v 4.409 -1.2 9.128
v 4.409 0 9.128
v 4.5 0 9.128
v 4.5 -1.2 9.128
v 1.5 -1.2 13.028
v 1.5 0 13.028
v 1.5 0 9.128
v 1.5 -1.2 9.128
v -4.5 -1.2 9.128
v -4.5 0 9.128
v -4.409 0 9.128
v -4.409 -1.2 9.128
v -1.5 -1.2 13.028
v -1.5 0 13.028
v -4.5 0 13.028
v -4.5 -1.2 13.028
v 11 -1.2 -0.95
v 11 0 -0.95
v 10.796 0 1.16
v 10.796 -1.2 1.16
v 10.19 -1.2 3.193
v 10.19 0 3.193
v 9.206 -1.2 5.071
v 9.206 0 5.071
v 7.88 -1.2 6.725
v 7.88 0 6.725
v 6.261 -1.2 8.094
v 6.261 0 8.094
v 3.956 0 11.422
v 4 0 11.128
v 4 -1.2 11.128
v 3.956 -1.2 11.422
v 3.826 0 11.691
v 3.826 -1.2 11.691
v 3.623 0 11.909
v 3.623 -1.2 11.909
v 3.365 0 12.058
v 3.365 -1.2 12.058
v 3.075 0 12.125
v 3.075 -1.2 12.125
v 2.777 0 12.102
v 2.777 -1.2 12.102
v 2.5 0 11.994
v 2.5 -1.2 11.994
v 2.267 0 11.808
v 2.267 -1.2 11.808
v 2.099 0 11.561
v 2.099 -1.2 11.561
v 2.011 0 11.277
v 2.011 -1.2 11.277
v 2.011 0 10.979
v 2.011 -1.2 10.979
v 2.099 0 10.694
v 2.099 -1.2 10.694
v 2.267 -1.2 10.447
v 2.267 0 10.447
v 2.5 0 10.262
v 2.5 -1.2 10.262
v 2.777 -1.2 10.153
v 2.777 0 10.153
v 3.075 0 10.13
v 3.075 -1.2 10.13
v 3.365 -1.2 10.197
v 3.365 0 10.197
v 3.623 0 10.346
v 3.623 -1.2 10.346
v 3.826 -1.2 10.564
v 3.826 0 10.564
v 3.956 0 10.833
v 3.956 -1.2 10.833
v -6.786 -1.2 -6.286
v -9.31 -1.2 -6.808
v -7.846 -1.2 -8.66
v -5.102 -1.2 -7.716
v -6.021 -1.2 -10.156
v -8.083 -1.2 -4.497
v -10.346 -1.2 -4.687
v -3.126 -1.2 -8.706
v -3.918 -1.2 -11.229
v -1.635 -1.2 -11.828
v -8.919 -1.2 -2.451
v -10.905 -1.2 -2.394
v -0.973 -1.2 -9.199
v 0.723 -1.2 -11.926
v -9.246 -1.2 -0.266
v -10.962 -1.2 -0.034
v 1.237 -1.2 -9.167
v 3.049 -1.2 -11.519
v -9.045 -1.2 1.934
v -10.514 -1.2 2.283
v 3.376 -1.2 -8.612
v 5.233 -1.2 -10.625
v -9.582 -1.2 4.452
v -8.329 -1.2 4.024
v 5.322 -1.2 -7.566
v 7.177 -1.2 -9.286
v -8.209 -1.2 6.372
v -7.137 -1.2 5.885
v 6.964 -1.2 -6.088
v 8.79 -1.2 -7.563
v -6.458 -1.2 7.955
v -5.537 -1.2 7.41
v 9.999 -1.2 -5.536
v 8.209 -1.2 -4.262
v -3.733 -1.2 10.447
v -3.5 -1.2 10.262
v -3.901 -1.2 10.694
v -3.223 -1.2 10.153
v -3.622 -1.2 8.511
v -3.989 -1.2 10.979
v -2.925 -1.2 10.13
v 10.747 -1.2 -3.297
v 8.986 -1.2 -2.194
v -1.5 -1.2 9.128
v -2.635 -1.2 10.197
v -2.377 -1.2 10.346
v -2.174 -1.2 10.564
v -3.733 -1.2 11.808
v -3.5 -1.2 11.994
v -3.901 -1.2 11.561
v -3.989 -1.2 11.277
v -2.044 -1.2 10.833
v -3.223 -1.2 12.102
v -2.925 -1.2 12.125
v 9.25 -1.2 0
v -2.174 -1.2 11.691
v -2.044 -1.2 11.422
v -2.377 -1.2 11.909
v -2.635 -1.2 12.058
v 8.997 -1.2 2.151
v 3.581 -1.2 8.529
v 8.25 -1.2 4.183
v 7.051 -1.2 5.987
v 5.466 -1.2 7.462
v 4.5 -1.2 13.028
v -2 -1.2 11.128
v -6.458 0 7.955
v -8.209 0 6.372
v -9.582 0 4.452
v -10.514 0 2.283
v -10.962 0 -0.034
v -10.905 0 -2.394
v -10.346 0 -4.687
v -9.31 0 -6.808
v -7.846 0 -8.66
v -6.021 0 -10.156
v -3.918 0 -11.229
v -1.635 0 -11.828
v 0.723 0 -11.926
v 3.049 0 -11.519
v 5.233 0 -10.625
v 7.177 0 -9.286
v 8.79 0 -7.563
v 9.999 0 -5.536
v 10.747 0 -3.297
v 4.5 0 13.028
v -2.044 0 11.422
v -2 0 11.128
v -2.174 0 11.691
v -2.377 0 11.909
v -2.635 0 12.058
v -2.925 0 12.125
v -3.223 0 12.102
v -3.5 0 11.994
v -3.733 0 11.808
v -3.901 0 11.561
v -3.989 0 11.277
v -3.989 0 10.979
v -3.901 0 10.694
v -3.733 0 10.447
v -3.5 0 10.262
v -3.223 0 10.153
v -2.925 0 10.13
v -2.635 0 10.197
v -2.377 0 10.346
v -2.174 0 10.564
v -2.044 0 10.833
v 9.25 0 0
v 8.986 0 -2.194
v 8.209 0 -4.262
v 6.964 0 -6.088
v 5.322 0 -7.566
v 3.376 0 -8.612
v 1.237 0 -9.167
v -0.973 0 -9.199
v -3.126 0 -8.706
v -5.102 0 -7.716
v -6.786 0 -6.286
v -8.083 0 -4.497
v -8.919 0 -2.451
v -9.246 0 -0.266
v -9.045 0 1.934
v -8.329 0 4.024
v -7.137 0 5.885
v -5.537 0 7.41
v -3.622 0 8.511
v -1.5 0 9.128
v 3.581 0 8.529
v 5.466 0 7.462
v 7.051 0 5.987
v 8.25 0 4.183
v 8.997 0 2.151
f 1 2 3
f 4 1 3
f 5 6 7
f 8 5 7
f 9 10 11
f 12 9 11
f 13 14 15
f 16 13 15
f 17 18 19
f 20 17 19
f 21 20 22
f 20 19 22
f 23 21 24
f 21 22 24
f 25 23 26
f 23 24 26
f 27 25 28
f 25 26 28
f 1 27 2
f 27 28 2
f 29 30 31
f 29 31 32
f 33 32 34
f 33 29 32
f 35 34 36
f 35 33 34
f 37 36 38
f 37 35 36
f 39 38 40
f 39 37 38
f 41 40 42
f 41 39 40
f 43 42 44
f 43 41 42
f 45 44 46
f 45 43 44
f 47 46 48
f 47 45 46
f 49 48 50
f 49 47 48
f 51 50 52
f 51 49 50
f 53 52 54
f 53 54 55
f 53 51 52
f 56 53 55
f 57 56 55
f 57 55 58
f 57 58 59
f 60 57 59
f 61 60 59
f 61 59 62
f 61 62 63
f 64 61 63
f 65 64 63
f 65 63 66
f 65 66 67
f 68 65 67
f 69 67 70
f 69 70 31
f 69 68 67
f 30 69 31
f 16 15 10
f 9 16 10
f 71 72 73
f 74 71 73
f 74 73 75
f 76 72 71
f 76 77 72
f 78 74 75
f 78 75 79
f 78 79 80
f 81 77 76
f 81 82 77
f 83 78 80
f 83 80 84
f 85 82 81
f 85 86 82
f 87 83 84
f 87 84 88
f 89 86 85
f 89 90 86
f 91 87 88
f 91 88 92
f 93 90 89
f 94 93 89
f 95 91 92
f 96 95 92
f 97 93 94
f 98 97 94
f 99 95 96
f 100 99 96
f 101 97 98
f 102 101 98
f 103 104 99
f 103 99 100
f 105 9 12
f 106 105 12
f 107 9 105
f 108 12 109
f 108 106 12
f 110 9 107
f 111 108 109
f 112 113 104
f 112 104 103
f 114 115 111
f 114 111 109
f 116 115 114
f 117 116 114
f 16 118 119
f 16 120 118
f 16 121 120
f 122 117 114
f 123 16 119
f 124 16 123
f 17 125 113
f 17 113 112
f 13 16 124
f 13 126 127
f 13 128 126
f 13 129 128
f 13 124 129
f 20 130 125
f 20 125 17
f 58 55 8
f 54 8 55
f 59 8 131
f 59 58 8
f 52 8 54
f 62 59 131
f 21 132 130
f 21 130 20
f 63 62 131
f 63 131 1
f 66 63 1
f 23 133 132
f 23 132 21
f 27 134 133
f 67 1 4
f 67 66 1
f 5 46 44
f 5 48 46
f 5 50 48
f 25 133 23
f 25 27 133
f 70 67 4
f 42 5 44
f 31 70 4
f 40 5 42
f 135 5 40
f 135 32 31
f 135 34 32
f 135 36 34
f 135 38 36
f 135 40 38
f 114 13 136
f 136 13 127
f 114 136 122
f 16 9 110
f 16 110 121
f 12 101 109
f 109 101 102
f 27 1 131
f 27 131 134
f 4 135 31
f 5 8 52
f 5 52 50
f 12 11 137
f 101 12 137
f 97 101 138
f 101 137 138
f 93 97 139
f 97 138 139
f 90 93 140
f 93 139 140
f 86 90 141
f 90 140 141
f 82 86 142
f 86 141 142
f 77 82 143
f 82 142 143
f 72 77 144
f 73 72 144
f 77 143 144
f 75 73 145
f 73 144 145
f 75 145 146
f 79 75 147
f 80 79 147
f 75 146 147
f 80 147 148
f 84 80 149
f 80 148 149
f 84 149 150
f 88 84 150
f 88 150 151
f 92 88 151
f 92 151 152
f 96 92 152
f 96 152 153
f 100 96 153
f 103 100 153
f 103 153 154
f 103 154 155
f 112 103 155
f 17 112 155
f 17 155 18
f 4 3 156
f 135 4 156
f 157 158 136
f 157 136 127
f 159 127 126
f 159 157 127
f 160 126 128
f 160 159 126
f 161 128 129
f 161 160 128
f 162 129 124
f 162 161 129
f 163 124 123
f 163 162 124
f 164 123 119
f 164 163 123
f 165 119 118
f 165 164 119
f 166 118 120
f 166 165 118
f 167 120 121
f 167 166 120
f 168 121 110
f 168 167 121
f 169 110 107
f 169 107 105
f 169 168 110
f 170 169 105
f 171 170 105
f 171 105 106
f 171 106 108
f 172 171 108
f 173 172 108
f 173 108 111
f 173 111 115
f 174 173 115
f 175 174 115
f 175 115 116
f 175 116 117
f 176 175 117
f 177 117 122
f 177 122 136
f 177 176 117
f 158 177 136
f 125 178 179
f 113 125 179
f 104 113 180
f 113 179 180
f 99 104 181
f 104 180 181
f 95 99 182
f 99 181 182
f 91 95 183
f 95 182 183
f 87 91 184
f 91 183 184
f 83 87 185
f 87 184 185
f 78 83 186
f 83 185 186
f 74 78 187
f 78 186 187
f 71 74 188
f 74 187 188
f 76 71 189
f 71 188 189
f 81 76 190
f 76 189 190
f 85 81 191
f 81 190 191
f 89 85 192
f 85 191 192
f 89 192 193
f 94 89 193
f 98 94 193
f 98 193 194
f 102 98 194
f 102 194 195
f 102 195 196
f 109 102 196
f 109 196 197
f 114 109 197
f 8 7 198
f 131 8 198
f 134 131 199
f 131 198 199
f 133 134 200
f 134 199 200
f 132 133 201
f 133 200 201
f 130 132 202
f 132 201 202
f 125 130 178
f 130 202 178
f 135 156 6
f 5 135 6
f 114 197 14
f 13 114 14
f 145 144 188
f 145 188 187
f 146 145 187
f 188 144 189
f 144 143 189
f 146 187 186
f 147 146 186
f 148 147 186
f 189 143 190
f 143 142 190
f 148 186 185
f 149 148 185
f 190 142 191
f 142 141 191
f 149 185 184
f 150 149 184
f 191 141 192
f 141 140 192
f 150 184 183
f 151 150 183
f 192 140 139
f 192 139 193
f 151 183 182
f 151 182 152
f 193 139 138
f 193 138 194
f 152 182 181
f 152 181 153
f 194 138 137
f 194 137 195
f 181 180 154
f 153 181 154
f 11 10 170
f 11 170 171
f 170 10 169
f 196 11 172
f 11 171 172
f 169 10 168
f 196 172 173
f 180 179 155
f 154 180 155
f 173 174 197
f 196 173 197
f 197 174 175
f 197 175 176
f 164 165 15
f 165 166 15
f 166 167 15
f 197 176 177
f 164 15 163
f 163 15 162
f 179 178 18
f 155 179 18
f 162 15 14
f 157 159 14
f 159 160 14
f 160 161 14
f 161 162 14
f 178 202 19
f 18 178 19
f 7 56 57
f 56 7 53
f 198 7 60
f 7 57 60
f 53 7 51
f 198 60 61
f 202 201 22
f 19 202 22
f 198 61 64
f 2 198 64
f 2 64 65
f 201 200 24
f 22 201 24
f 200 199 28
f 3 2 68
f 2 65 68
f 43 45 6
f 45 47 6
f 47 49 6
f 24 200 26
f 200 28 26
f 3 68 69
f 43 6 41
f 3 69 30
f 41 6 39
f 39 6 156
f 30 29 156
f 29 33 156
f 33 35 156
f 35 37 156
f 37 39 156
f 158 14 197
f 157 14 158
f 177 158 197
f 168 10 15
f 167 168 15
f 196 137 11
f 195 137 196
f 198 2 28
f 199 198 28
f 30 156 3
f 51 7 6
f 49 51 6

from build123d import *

# Parameters (mm, degrees)
F0_R     = 1
F1_DEPTH = 1.2


with BuildPart() as f1:
    # F0 (on Front) → F1 (new body)
    with BuildSketch(Plane.XZ):
        with BuildLine():
            ThreePointArc((1.5, 9.1275681318), (7.0511523881, 5.9869650074), (9.25, 0))
            ThreePointArc((9.25, 0), (-5.9869650074, -7.0511523881), (-1.5, 9.1275681318))
            Line((-1.5, 9.1275681318), (-4.4093787034, 9.1275681318))
            ThreePointArc((-4.4093787034, 9.1275681318), (-6.0206658379, -10.156062289), (11, -0.95))
            ThreePointArc((11, -0.95), (9.206062289, 5.0706658379), (4.4093787034, 9.1275681318))
            Line((4.4093787034, 9.1275681318), (1.5, 9.1275681318))
        make_face()
        with BuildLine():
            Line((-4.5, 9.1275681318), (-4.4093787034, 9.1275681318))
            ThreePointArc((-4.4093787034, 9.1275681318), (-2.9829779875, 9.6378157486), (-1.5, 9.9472473589))
            Line((-1.5, 9.9472473589), (-1.5, 13.0275681318))
            Line((-1.5, 13.0275681318), (-4.5, 13.0275681318))
            Line((-4.5, 13.0275681318), (-4.5, 9.1275681318))
        make_face()
        with Locations((-3, 11.1275681318)):
            Circle(F0_R, mode=Mode.SUBTRACT)
        with BuildLine():
            Line((-4.4093787034, 9.1275681318), (-1.5, 9.1275681318))
            Line((-1.5, 9.1275681318), (-1.5, 9.9472473589))
            ThreePointArc((-1.5, 9.9472473589), (-2.9829779875, 9.6378157486), (-4.4093787034, 9.1275681318))
        make_face()
        with BuildLine():
            ThreePointArc((1.5, 9.9472473589), (2.9829779875, 9.6378157486), (4.4093787034, 9.1275681318))
            Line((4.4093787034, 9.1275681318), (4.5, 9.1275681318))
            Line((4.5, 9.1275681318), (4.5, 13.0275681318))
            Line((4.5, 13.0275681318), (1.5, 13.0275681318))
            Line((1.5, 13.0275681318), (1.5, 9.9472473589))
        make_face()
        with Locations((3, 11.1275681318)):
            Circle(F0_R, mode=Mode.SUBTRACT)
        with BuildLine():
            Line((1.5, 9.9472473589), (1.5, 9.1275681318))
            Line((1.5, 9.1275681318), (4.4093787034, 9.1275681318))
            ThreePointArc((4.4093787034, 9.1275681318), (2.9829779875, 9.6378157486), (1.5, 9.9472473589))
        make_face()
    extrude(amount=F1_DEPTH)


solid = f1.part
